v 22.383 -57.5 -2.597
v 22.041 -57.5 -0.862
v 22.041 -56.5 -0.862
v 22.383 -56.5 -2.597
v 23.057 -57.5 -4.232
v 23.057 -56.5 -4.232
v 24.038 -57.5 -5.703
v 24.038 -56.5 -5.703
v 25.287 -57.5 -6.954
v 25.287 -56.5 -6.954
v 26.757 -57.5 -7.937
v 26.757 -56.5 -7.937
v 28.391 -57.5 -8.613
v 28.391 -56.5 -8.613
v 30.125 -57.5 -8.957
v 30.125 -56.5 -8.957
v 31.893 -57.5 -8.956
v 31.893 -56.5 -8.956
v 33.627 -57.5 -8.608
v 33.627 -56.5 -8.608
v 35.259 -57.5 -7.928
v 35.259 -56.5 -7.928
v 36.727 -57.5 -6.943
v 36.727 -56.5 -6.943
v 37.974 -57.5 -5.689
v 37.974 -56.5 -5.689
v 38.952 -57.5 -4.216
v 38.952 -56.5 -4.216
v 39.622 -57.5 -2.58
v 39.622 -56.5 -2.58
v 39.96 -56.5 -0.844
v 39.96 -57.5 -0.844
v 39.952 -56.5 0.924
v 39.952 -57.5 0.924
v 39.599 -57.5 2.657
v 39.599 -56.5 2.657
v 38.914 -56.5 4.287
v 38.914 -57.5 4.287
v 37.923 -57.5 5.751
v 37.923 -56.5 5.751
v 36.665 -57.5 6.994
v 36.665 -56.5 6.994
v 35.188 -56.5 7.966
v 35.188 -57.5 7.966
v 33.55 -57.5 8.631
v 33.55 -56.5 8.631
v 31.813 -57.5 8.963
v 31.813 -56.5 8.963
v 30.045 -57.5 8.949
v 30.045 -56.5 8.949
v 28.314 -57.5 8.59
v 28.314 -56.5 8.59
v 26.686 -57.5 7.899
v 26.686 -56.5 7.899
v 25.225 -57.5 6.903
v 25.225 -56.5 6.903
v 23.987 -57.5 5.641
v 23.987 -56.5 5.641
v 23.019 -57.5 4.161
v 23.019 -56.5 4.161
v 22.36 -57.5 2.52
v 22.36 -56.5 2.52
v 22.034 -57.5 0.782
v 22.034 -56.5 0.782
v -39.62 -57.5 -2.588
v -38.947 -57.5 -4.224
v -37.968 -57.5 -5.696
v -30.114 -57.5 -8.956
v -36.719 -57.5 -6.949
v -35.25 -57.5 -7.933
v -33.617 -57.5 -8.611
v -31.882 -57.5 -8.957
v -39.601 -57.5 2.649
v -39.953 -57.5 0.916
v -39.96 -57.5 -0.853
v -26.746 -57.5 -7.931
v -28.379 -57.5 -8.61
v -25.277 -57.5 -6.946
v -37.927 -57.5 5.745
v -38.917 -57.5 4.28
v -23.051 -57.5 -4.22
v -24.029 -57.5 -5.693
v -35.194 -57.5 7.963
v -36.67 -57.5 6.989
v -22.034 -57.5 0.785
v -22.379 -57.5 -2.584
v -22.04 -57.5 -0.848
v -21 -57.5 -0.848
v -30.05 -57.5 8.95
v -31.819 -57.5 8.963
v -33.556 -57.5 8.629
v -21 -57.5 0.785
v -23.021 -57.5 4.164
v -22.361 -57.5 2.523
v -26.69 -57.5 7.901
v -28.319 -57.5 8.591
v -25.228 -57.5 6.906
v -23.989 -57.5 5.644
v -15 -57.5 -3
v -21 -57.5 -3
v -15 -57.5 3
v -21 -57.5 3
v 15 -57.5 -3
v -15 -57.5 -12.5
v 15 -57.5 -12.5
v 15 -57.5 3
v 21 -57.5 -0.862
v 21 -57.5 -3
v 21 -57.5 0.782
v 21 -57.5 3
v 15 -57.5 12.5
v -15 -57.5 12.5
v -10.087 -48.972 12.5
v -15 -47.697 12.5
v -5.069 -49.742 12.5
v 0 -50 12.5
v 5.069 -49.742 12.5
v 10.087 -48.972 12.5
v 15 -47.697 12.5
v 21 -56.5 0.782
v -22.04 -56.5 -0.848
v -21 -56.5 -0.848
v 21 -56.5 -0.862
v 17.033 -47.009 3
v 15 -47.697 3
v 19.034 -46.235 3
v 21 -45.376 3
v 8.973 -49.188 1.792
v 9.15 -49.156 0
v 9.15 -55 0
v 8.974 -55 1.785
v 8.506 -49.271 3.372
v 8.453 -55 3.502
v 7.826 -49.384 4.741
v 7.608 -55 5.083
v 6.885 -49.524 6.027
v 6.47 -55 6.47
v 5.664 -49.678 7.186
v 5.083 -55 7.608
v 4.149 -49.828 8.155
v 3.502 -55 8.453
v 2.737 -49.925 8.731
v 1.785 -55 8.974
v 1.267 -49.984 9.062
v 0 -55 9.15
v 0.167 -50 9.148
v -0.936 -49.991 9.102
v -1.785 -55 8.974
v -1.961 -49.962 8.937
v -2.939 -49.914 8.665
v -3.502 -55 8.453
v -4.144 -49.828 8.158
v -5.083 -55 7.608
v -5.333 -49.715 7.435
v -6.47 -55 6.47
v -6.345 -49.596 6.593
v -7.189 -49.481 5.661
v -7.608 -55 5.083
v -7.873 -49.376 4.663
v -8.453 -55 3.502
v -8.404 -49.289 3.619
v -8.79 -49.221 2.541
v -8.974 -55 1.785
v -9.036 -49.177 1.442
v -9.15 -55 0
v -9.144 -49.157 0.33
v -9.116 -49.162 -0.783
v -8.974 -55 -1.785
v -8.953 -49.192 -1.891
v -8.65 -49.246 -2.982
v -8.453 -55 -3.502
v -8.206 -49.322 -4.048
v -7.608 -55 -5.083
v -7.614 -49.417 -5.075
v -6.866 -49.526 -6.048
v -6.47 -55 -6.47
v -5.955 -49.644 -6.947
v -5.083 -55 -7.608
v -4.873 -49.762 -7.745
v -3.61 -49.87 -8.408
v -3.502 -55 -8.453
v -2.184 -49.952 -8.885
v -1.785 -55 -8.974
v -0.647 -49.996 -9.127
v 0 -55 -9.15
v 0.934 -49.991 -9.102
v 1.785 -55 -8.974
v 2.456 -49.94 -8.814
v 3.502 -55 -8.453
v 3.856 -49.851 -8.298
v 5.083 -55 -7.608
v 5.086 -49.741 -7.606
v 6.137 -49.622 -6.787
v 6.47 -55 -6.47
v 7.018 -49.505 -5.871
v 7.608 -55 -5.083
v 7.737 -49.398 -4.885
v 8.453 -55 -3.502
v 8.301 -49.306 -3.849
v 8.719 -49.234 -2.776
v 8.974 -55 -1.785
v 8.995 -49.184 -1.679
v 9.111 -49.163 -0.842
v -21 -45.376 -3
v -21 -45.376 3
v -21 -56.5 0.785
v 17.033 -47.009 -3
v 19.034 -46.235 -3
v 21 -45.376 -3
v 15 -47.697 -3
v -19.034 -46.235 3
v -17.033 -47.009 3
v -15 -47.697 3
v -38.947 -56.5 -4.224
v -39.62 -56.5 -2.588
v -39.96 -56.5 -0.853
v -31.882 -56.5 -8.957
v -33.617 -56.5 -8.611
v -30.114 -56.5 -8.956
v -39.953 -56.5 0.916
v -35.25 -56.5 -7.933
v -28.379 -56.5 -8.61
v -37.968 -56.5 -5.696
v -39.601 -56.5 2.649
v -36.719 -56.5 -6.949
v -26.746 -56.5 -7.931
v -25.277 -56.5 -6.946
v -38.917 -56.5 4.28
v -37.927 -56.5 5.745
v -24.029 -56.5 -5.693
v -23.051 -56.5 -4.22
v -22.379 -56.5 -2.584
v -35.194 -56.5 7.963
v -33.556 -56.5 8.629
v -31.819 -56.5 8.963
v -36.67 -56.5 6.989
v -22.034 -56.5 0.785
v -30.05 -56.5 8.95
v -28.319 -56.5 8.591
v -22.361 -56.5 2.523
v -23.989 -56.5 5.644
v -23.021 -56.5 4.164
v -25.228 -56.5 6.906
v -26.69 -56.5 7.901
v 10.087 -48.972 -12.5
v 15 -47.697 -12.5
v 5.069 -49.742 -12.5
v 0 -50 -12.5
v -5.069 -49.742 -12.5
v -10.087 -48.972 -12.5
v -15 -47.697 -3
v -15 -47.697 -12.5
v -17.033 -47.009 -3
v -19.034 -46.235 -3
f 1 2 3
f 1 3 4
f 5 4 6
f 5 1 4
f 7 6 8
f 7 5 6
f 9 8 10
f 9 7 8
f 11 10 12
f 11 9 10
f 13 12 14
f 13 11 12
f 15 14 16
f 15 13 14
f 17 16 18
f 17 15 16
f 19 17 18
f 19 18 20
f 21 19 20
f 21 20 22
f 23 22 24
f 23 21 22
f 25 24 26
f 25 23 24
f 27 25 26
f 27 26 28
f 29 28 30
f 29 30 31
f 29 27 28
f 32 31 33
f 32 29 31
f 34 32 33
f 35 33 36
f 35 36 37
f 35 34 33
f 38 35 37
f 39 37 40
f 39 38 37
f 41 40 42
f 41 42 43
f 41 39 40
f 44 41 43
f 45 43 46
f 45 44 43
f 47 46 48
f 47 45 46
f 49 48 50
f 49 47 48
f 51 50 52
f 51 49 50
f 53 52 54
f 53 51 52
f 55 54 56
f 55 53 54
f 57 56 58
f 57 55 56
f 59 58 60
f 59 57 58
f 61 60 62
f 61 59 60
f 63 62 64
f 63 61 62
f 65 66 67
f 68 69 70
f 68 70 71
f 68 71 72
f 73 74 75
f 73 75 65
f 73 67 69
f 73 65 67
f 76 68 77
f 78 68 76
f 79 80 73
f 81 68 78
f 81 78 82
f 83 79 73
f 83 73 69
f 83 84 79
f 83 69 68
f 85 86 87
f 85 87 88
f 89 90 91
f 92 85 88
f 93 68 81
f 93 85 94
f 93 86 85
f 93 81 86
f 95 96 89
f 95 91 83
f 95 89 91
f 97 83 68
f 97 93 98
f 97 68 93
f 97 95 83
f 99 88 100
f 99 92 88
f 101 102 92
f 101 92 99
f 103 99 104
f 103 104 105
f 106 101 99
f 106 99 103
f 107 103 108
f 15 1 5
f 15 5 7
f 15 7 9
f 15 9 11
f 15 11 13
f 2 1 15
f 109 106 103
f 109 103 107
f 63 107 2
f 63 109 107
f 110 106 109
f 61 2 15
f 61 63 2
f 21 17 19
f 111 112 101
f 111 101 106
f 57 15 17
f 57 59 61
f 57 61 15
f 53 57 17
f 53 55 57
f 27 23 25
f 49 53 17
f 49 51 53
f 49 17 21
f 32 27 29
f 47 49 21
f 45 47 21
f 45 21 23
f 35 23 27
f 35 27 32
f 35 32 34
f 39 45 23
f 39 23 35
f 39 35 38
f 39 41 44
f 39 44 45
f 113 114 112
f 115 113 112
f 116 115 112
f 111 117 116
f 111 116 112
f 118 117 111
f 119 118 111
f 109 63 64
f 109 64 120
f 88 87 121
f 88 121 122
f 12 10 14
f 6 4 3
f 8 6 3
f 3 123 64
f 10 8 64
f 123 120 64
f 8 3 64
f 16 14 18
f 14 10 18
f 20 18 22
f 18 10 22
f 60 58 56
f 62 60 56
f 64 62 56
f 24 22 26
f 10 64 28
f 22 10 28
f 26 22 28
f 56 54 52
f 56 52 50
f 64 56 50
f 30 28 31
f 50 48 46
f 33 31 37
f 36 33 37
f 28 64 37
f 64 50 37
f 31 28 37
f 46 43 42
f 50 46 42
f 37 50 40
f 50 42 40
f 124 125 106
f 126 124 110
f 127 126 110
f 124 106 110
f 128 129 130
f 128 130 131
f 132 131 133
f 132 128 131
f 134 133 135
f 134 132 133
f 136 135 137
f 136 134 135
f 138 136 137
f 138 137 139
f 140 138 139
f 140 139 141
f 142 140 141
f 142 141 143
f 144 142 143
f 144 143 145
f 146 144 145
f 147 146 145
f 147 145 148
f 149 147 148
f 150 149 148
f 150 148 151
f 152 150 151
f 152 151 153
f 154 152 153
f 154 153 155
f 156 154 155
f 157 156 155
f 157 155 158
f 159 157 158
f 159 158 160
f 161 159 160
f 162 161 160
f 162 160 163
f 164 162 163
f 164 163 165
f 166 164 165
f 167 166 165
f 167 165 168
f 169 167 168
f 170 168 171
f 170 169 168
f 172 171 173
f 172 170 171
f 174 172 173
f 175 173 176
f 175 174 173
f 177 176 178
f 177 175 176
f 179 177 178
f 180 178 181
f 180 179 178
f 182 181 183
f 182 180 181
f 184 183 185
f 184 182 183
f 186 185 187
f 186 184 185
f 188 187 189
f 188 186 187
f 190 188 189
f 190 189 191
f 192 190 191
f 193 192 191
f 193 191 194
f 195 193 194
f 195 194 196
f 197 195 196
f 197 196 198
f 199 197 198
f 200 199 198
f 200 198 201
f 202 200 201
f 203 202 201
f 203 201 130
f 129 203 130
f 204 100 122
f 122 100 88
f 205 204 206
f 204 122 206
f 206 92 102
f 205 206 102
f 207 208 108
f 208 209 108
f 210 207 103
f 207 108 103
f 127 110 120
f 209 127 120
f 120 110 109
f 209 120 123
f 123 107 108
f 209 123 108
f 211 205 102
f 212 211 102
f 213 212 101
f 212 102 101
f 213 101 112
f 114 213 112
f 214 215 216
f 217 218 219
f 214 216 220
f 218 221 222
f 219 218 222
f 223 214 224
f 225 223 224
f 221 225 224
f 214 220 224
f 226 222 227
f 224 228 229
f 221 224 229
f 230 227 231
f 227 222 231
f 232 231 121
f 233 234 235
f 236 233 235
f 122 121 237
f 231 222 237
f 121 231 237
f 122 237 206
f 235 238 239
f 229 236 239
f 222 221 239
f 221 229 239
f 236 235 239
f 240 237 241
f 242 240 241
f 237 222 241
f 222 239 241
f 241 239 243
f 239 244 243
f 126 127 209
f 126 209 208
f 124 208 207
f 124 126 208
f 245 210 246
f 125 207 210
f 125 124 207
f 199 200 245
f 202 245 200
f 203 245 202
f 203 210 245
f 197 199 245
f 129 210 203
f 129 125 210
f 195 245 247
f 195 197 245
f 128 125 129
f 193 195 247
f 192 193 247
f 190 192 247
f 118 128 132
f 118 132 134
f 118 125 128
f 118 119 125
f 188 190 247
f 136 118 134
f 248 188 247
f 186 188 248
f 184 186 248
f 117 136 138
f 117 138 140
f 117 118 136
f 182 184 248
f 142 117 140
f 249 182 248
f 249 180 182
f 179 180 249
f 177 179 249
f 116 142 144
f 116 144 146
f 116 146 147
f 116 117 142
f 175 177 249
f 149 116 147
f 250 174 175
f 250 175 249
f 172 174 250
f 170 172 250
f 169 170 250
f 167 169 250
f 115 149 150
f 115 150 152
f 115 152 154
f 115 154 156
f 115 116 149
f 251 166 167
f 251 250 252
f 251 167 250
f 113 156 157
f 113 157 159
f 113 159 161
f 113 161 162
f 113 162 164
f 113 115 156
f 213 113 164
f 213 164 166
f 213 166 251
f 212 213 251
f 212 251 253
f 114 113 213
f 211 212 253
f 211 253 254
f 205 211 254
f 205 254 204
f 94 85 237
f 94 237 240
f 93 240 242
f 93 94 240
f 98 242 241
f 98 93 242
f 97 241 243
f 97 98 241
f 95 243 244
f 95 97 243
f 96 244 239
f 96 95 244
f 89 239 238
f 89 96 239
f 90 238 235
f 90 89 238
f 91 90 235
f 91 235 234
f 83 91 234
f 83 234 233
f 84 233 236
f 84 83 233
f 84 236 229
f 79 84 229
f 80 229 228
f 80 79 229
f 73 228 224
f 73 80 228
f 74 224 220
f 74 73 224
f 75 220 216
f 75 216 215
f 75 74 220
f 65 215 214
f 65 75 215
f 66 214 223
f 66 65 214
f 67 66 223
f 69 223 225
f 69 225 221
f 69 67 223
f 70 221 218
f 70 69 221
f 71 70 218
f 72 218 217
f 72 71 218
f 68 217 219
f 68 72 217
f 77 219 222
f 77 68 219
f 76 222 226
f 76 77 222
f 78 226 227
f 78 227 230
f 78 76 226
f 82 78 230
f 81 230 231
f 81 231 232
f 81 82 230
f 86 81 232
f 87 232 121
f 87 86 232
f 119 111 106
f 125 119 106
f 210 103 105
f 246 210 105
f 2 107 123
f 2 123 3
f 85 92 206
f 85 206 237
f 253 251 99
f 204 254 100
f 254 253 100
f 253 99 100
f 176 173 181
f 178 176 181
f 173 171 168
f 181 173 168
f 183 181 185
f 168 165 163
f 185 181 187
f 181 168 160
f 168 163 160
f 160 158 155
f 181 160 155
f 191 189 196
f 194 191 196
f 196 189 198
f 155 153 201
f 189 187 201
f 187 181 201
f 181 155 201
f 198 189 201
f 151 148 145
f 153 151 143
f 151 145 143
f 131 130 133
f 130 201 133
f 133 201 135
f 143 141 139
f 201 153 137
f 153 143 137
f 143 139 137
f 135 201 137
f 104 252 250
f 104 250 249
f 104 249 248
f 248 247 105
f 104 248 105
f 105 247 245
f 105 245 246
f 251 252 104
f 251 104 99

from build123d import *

# Parameters (mm, degrees)
F1_DEPTH  = 12.5
F3_DEPTH  = 25
F4_R      = 9.15
F5_DEPTH  = 55
F6_R      = 9.05
F7_DEPTH  = 52.5
F9_DEPTH  = 3
F11_DEPTH = 57.501
F13_DEPTH = 1


with BuildPart() as f1:
    # F0 (on Top) → F1 (new body, symmetric)
    with BuildSketch(Plane.XY):
        with BuildLine():
            ThreePointArc((50, 0), (0, -50), (-50, 0))
            Line((-50, 0), (-55, 0))
            ThreePointArc((-55, 0), (0, -55), (55, 0))
            Line((55, 0), (50, 0))
        make_face()
    extrude(amount=F1_DEPTH, both=True)

    # F2 (on face) → F3 (join)
    with BuildSketch(Plane.XY.offset(12.5)):
        with BuildLine():
            ThreePointArc((55, 0), (0, -55), (-55, 0))
            Line((-55, 0), (-55, -57.5))
            Line((-55, -57.5), (0, -57.5))
            Line((0, -57.5), (55, -57.5))
            Line((55, -57.5), (55, 0))
        make_face()
    extrude(amount=-F3_DEPTH)

    # F4 (on Front) → F5 (cut)
    with BuildSketch(Plane.XZ):
        Circle(F4_R)
    extrude(amount=F5_DEPTH, mode=Mode.SUBTRACT)

    # F6 (on Right) → F7 (cut, symmetric)
    with BuildSketch(Plane.YZ):
        with Locations((-11, 0)):
            Circle(F6_R)
    extrude(amount=F7_DEPTH, both=True, mode=Mode.SUBTRACT)

    # F8 (on face) → F9 (join)
    with BuildSketch(Plane.XZ.offset(57.5)):
        with BuildLine():
            Line((55, -1.825145), (56.187007, -1.825145))
            ThreePointArc((56.187007, -1.825145), (73.996764, 0.241309), (56.101841, 1.350101))
            Line((56.101841, 1.350101), (55, 1.350101))
            Line((55, 1.350101), (55, -1.825145))
        make_face()
        with BuildLine():
            Line((-55, 0.589209), (-56.019308, 0.589209))
            ThreePointArc((-56.019308, 0.589209), (-73.999691, -0.074534), (-56.010781, -0.440385))
            Line((-56.010781, -0.440385), (-55, -0.440385))
            Line((-55, -0.440385), (-55, 0.589209))
        make_face()
        with BuildLine():
            Line((26.665892, -12.5), (26.665892, -13.538735))
            ThreePointArc((26.665892, -13.538735), (27.491135, -31.499996), (28.35176, -13.540396))
            Line((28.35176, -13.540396), (28.35176, -12.5))
            Line((28.35176, -12.5), (26.665892, -12.5))
        make_face()
        with BuildLine():
            Line((-28.294771, -12.5), (-28.294771, -13.535161))
            ThreePointArc((-28.294771, -13.535161), (-27.521055, -31.499975), (-26.663293, -13.538978))
            Line((-26.663293, -13.538978), (-26.663293, -12.5))
            Line((-26.663293, -12.5), (-28.294771, -12.5))
        make_face()
        with BuildLine():
            Line((-26.327094, 12.5), (-26.327094, 13.576756))
            ThreePointArc((-26.327094, 13.576756), (-27.667739, 31.498437), (-28.339533, 13.539242))
            Line((-28.339533, 13.539242), (-28.339533, 12.5))
            Line((-28.339533, 12.5), (-26.327094, 12.5))
        make_face()
        with BuildLine():
            Line((28.639116, 12.5), (28.639116, 13.572379))
            ThreePointArc((28.639116, 13.572379), (27.368028, 31.499032), (26.623167, 13.542815))
            Line((26.623167, 13.542815), (26.623167, 12.5))
            Line((26.623167, 12.5), (28.639116, 12.5))
        make_face()
    extrude(amount=-F9_DEPTH)

    # F10 (on face) → F11 (cut, through all)
    with BuildSketch(Plane.XZ.offset(57.5)):
        Polygon((-15, 3), (-15, 12.5), (-15, 43.200534), (-80.149591, 43.200534), (-80.149591, -41.894257), (-15, -41.894257), (-15, -12.5), (-15, -3), (-21, -3), (-21, 0), (-21, 3), align=None)
        Polygon((15, 42.100117), (15, 12.5), (15, 3), (21, 3), (21, 0), (21, -3), (15, -3), (15, -12.5), (15, -47.119375), (79.776369, -47.119375), (79.776369, 42.100117), align=None)
    extrude(amount=-F11_DEPTH, mode=Mode.SUBTRACT)

    # F12 (on face) → F13 (join)
    with BuildSketch(Plane.XZ.offset(57.5)):
        with BuildLine():
            Line((-21, 0.785101), (-22.034309, 0.785101))
            ThreePointArc((-22.034309, 0.785101), (-39.999944, 0.031742), (-22.04007, -0.848323))
            Line((-22.04007, -0.848323), (-21, -0.848323))
            Line((-21, -0.848323), (-21, 0.785101))
        make_face()
        with BuildLine():
            Line((21, -0.86237), (22.041411, -0.86237))
            ThreePointArc((22.041411, -0.86237), (39.99991, 0.040222), (22.034061, 0.782262))
            Line((22.034061, 0.782262), (21, 0.782262))
            Line((21, 0.782262), (21, -0.86237))
        make_face()
    extrude(amount=-F13_DEPTH)


solid = f1.part
